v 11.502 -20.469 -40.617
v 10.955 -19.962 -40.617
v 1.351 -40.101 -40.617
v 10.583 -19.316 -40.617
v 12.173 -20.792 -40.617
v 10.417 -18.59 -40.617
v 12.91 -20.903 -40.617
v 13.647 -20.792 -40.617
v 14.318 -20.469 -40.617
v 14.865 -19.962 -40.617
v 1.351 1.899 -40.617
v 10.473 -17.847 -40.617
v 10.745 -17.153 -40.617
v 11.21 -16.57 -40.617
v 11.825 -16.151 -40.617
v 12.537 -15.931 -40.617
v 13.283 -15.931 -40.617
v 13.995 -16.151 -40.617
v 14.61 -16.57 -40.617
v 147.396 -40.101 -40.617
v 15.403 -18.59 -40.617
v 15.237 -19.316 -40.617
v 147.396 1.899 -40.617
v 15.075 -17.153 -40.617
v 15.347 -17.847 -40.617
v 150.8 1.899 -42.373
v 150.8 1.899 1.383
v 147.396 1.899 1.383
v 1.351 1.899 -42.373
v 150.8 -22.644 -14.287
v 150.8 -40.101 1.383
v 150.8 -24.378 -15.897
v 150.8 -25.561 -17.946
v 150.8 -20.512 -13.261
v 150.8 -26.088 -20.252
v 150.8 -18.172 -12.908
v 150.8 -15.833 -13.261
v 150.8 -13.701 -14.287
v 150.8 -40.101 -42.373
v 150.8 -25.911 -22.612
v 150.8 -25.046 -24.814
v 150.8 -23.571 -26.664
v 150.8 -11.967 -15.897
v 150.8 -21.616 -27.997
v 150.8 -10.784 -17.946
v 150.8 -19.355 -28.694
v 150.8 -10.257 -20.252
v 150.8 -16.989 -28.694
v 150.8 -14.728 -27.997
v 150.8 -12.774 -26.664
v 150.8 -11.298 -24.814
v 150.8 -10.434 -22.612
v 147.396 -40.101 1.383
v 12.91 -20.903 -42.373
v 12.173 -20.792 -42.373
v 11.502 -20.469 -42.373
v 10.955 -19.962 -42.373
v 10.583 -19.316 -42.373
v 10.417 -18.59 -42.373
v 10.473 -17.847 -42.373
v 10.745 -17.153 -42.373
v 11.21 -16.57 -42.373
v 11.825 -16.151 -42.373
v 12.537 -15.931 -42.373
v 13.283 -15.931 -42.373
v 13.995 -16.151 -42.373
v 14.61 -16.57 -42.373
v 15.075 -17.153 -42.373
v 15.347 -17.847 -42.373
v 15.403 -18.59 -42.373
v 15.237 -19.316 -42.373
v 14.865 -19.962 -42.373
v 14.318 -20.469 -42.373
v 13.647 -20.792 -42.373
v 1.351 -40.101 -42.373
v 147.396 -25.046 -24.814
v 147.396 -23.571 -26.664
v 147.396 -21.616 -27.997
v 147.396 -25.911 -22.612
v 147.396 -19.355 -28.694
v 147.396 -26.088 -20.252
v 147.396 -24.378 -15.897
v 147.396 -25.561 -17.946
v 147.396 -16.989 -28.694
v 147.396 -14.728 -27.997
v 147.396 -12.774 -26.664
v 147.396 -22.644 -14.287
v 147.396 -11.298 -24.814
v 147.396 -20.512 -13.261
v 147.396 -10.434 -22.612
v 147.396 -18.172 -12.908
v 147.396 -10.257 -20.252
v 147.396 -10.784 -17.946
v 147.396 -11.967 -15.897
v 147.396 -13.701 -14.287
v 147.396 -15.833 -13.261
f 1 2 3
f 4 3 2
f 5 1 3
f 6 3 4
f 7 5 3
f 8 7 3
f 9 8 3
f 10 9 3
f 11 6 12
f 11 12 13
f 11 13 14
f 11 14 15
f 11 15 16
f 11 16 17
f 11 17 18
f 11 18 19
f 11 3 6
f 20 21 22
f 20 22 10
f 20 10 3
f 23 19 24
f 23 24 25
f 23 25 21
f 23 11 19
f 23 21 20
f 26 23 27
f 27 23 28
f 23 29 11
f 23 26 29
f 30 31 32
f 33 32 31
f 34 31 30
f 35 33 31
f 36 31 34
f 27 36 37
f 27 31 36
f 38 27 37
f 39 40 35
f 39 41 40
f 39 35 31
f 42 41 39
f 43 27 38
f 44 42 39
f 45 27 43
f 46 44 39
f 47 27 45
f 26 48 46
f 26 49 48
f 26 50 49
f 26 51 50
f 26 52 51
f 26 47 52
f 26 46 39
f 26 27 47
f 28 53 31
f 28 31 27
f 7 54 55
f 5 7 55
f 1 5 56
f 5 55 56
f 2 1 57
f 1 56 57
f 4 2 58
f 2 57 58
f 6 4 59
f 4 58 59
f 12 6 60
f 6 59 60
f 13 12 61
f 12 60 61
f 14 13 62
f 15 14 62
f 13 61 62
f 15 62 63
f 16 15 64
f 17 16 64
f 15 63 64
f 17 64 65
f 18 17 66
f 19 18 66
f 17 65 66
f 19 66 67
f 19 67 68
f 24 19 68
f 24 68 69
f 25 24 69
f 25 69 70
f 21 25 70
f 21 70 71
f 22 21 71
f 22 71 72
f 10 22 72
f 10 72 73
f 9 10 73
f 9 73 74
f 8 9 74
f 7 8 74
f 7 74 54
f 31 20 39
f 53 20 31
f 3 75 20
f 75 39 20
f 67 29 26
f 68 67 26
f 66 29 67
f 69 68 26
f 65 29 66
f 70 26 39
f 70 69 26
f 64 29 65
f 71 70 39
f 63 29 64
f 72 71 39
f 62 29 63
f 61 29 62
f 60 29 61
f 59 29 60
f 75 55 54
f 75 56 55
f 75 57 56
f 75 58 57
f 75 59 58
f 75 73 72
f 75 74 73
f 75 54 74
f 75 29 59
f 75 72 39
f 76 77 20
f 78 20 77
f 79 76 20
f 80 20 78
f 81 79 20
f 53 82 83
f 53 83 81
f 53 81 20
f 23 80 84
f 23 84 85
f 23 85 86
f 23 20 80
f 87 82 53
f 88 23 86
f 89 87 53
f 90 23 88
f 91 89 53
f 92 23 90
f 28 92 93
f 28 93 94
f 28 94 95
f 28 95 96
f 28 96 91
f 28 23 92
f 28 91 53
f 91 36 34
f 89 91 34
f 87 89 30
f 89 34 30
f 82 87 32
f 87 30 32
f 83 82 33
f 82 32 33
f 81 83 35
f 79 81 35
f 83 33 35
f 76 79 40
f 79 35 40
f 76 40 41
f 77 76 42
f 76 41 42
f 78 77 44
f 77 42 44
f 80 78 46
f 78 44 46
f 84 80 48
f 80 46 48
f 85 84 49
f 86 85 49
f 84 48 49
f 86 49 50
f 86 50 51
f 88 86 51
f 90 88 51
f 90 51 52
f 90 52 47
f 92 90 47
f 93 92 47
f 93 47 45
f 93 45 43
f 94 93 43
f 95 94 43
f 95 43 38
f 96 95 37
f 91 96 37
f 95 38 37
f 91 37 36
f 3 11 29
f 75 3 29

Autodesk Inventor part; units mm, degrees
ref_plane "YZ Plane" through (0, 0, 0) normal (1, 0, 0) x (0, 1, 0)
ref_plane "XZ Plane" through (0, 0, 0) normal (0, 1, 0) x (-1, 0, 0)
ref_plane "XY Plane" through (0, 0, 0) normal (0, 0, 1) x (1, 0, 0)
sketch "Sketch1" plane through (0, 0, 0) normal (1, 0, 0) x (0, 1, 0)
  line L0 (1.8986, 1.3831) -> (-40.1014, 1.3831)
  line L1 (-40.1014, 1.3831) -> (-40.1014, -42.3731)
  line L2 (-40.1014, -42.3731) -> (1.8986, -42.3731)
  line L3 (1.8986, -42.3731) -> (1.8986, 1.3831)
  point P0 (0, 0)
  dimension "d0" = 42
extrude "Extrusion1" add sketch "Sketch1" along normal blind 100
sketch "Sketch3" plane through (0, 0, 0) normal (-1, 0, 0) x (0, 0, 1)
  point P0 (0, 0)
sketch "Sketch8" plane through (0, 0, 0) normal (-1, 0, 0) x (0, 0, 1)
  point P0 (0, 0)
  point P1 (-20.6894, -17.7504)
hole "Hole4" at (0, -17.7504, -20.6894) direction (1, 0, 0) diameter 15.875 end through all
sketch "Sketch9" plane through (0, -40.1014, 1.3831) normal (0, 0, 1) x (1, 0, 0)
  line L0 (0, 42) -> (100, 42) projected
  line L1 (0, 0) -> (100, 0) projected
  line L2 (1.351, 42) -> (99.1356, 42)
  line L3 (99.1356, 42) -> (99.1356, 0)
  line L4 (99.1356, 0) -> (1.351, 0)
  line L5 (1.351, 0) -> (1.351, 42)
  point P0 (0, 40.1014)
  point P1 (1.351, 0)
extrude "Extrusion4" cut sketch "Sketch9" against normal blind 42
sketch "Sketch10" plane through (1.351, -40.1014, 1.3831) normal (1, 0, 0) x (0, 0, -1)
  line L0 (0, 42) -> (42, 42) projected
  line L1 (43.7562, 0) -> (43.7562, 42) projected
  line L2 (0, 42) -> (43.7562, 42)
  line L3 (43.7562, 42) -> (43.7562, 0)
  line L4 (43.7562, 0) -> (0, 0)
  line L5 (0, 0) -> (0, 42)
  point P0 (1.3831, 40.1014)
extrude "Extrusion5" cut sketch "Sketch10" against normal blind 25.4
sketch "Sketch11" plane through (0, -40.1014, -40.6169) normal (0, 0, 1) x (1, 0, 0)
  point P0 (0, 40.1014)
  point P1 (12.91, 21.6985)
hole "Hole5" at (12.91, -18.403, -40.6169) direction (0, 0, -1) diameter 5 end through all
sketch "Sketch12" plane through (100, 0, 0) normal (1, 0, 0) x (0, 0, -1)
  line L0 (42.3731, 1.8986) -> (-1.3831, 1.8986) projected
  line L1 (-1.3831, 1.8986) -> (42.3731, 1.8986)
  line L2 (42.3731, 1.8986) -> (42.3731, -40.1014)
  line L3 (42.3731, -40.1014) -> (-1.3831, -40.1014)
  line L4 (-1.3831, -40.1014) -> (-1.3831, 1.8986)
  point P0 (0, 0)
extrude "Extrusion6" add sketch "Sketch12" along normal blind 50.8
sketch "Sketch13" plane through (99.1356, -40.1014, 1.3831) normal (-1, 0, 0) x (0, 0, 1)
  line L0 (-42, 42) -> (0, 42) projected
  line L1 (0, 42) -> (0, 0) projected
  line L2 (-42, 42) -> (0, 42)
  line L3 (0, 42) -> (0, 0)
  line L4 (0, 0) -> (-42, 0)
  line L5 (-42, 0) -> (-42, 42)
  point P0 (-1.3831, 40.1014)
sketch "Sketch14" plane through (100, -17.7504, -20.6894) normal (-1, 0, 0) x (0, 0, 1)
  point P0 (20.6894, 17.7504)
  point P1 (-0.1562, -0.422)
hole "Hole6" at (100, -18.1724, -20.8455) direction (1, 0, 0) diameter 15.875 end through all
extrude "Extrusion7" cut sketch "Sketch13" against normal blind 48.26
sketch "Sketch15" plane through (0, -40.1014, -40.6169) normal (0, 0, 1) x (1, 0, 0)
  point P0 (0, 40.1014)
properties part number "clamp 2 pipe"
